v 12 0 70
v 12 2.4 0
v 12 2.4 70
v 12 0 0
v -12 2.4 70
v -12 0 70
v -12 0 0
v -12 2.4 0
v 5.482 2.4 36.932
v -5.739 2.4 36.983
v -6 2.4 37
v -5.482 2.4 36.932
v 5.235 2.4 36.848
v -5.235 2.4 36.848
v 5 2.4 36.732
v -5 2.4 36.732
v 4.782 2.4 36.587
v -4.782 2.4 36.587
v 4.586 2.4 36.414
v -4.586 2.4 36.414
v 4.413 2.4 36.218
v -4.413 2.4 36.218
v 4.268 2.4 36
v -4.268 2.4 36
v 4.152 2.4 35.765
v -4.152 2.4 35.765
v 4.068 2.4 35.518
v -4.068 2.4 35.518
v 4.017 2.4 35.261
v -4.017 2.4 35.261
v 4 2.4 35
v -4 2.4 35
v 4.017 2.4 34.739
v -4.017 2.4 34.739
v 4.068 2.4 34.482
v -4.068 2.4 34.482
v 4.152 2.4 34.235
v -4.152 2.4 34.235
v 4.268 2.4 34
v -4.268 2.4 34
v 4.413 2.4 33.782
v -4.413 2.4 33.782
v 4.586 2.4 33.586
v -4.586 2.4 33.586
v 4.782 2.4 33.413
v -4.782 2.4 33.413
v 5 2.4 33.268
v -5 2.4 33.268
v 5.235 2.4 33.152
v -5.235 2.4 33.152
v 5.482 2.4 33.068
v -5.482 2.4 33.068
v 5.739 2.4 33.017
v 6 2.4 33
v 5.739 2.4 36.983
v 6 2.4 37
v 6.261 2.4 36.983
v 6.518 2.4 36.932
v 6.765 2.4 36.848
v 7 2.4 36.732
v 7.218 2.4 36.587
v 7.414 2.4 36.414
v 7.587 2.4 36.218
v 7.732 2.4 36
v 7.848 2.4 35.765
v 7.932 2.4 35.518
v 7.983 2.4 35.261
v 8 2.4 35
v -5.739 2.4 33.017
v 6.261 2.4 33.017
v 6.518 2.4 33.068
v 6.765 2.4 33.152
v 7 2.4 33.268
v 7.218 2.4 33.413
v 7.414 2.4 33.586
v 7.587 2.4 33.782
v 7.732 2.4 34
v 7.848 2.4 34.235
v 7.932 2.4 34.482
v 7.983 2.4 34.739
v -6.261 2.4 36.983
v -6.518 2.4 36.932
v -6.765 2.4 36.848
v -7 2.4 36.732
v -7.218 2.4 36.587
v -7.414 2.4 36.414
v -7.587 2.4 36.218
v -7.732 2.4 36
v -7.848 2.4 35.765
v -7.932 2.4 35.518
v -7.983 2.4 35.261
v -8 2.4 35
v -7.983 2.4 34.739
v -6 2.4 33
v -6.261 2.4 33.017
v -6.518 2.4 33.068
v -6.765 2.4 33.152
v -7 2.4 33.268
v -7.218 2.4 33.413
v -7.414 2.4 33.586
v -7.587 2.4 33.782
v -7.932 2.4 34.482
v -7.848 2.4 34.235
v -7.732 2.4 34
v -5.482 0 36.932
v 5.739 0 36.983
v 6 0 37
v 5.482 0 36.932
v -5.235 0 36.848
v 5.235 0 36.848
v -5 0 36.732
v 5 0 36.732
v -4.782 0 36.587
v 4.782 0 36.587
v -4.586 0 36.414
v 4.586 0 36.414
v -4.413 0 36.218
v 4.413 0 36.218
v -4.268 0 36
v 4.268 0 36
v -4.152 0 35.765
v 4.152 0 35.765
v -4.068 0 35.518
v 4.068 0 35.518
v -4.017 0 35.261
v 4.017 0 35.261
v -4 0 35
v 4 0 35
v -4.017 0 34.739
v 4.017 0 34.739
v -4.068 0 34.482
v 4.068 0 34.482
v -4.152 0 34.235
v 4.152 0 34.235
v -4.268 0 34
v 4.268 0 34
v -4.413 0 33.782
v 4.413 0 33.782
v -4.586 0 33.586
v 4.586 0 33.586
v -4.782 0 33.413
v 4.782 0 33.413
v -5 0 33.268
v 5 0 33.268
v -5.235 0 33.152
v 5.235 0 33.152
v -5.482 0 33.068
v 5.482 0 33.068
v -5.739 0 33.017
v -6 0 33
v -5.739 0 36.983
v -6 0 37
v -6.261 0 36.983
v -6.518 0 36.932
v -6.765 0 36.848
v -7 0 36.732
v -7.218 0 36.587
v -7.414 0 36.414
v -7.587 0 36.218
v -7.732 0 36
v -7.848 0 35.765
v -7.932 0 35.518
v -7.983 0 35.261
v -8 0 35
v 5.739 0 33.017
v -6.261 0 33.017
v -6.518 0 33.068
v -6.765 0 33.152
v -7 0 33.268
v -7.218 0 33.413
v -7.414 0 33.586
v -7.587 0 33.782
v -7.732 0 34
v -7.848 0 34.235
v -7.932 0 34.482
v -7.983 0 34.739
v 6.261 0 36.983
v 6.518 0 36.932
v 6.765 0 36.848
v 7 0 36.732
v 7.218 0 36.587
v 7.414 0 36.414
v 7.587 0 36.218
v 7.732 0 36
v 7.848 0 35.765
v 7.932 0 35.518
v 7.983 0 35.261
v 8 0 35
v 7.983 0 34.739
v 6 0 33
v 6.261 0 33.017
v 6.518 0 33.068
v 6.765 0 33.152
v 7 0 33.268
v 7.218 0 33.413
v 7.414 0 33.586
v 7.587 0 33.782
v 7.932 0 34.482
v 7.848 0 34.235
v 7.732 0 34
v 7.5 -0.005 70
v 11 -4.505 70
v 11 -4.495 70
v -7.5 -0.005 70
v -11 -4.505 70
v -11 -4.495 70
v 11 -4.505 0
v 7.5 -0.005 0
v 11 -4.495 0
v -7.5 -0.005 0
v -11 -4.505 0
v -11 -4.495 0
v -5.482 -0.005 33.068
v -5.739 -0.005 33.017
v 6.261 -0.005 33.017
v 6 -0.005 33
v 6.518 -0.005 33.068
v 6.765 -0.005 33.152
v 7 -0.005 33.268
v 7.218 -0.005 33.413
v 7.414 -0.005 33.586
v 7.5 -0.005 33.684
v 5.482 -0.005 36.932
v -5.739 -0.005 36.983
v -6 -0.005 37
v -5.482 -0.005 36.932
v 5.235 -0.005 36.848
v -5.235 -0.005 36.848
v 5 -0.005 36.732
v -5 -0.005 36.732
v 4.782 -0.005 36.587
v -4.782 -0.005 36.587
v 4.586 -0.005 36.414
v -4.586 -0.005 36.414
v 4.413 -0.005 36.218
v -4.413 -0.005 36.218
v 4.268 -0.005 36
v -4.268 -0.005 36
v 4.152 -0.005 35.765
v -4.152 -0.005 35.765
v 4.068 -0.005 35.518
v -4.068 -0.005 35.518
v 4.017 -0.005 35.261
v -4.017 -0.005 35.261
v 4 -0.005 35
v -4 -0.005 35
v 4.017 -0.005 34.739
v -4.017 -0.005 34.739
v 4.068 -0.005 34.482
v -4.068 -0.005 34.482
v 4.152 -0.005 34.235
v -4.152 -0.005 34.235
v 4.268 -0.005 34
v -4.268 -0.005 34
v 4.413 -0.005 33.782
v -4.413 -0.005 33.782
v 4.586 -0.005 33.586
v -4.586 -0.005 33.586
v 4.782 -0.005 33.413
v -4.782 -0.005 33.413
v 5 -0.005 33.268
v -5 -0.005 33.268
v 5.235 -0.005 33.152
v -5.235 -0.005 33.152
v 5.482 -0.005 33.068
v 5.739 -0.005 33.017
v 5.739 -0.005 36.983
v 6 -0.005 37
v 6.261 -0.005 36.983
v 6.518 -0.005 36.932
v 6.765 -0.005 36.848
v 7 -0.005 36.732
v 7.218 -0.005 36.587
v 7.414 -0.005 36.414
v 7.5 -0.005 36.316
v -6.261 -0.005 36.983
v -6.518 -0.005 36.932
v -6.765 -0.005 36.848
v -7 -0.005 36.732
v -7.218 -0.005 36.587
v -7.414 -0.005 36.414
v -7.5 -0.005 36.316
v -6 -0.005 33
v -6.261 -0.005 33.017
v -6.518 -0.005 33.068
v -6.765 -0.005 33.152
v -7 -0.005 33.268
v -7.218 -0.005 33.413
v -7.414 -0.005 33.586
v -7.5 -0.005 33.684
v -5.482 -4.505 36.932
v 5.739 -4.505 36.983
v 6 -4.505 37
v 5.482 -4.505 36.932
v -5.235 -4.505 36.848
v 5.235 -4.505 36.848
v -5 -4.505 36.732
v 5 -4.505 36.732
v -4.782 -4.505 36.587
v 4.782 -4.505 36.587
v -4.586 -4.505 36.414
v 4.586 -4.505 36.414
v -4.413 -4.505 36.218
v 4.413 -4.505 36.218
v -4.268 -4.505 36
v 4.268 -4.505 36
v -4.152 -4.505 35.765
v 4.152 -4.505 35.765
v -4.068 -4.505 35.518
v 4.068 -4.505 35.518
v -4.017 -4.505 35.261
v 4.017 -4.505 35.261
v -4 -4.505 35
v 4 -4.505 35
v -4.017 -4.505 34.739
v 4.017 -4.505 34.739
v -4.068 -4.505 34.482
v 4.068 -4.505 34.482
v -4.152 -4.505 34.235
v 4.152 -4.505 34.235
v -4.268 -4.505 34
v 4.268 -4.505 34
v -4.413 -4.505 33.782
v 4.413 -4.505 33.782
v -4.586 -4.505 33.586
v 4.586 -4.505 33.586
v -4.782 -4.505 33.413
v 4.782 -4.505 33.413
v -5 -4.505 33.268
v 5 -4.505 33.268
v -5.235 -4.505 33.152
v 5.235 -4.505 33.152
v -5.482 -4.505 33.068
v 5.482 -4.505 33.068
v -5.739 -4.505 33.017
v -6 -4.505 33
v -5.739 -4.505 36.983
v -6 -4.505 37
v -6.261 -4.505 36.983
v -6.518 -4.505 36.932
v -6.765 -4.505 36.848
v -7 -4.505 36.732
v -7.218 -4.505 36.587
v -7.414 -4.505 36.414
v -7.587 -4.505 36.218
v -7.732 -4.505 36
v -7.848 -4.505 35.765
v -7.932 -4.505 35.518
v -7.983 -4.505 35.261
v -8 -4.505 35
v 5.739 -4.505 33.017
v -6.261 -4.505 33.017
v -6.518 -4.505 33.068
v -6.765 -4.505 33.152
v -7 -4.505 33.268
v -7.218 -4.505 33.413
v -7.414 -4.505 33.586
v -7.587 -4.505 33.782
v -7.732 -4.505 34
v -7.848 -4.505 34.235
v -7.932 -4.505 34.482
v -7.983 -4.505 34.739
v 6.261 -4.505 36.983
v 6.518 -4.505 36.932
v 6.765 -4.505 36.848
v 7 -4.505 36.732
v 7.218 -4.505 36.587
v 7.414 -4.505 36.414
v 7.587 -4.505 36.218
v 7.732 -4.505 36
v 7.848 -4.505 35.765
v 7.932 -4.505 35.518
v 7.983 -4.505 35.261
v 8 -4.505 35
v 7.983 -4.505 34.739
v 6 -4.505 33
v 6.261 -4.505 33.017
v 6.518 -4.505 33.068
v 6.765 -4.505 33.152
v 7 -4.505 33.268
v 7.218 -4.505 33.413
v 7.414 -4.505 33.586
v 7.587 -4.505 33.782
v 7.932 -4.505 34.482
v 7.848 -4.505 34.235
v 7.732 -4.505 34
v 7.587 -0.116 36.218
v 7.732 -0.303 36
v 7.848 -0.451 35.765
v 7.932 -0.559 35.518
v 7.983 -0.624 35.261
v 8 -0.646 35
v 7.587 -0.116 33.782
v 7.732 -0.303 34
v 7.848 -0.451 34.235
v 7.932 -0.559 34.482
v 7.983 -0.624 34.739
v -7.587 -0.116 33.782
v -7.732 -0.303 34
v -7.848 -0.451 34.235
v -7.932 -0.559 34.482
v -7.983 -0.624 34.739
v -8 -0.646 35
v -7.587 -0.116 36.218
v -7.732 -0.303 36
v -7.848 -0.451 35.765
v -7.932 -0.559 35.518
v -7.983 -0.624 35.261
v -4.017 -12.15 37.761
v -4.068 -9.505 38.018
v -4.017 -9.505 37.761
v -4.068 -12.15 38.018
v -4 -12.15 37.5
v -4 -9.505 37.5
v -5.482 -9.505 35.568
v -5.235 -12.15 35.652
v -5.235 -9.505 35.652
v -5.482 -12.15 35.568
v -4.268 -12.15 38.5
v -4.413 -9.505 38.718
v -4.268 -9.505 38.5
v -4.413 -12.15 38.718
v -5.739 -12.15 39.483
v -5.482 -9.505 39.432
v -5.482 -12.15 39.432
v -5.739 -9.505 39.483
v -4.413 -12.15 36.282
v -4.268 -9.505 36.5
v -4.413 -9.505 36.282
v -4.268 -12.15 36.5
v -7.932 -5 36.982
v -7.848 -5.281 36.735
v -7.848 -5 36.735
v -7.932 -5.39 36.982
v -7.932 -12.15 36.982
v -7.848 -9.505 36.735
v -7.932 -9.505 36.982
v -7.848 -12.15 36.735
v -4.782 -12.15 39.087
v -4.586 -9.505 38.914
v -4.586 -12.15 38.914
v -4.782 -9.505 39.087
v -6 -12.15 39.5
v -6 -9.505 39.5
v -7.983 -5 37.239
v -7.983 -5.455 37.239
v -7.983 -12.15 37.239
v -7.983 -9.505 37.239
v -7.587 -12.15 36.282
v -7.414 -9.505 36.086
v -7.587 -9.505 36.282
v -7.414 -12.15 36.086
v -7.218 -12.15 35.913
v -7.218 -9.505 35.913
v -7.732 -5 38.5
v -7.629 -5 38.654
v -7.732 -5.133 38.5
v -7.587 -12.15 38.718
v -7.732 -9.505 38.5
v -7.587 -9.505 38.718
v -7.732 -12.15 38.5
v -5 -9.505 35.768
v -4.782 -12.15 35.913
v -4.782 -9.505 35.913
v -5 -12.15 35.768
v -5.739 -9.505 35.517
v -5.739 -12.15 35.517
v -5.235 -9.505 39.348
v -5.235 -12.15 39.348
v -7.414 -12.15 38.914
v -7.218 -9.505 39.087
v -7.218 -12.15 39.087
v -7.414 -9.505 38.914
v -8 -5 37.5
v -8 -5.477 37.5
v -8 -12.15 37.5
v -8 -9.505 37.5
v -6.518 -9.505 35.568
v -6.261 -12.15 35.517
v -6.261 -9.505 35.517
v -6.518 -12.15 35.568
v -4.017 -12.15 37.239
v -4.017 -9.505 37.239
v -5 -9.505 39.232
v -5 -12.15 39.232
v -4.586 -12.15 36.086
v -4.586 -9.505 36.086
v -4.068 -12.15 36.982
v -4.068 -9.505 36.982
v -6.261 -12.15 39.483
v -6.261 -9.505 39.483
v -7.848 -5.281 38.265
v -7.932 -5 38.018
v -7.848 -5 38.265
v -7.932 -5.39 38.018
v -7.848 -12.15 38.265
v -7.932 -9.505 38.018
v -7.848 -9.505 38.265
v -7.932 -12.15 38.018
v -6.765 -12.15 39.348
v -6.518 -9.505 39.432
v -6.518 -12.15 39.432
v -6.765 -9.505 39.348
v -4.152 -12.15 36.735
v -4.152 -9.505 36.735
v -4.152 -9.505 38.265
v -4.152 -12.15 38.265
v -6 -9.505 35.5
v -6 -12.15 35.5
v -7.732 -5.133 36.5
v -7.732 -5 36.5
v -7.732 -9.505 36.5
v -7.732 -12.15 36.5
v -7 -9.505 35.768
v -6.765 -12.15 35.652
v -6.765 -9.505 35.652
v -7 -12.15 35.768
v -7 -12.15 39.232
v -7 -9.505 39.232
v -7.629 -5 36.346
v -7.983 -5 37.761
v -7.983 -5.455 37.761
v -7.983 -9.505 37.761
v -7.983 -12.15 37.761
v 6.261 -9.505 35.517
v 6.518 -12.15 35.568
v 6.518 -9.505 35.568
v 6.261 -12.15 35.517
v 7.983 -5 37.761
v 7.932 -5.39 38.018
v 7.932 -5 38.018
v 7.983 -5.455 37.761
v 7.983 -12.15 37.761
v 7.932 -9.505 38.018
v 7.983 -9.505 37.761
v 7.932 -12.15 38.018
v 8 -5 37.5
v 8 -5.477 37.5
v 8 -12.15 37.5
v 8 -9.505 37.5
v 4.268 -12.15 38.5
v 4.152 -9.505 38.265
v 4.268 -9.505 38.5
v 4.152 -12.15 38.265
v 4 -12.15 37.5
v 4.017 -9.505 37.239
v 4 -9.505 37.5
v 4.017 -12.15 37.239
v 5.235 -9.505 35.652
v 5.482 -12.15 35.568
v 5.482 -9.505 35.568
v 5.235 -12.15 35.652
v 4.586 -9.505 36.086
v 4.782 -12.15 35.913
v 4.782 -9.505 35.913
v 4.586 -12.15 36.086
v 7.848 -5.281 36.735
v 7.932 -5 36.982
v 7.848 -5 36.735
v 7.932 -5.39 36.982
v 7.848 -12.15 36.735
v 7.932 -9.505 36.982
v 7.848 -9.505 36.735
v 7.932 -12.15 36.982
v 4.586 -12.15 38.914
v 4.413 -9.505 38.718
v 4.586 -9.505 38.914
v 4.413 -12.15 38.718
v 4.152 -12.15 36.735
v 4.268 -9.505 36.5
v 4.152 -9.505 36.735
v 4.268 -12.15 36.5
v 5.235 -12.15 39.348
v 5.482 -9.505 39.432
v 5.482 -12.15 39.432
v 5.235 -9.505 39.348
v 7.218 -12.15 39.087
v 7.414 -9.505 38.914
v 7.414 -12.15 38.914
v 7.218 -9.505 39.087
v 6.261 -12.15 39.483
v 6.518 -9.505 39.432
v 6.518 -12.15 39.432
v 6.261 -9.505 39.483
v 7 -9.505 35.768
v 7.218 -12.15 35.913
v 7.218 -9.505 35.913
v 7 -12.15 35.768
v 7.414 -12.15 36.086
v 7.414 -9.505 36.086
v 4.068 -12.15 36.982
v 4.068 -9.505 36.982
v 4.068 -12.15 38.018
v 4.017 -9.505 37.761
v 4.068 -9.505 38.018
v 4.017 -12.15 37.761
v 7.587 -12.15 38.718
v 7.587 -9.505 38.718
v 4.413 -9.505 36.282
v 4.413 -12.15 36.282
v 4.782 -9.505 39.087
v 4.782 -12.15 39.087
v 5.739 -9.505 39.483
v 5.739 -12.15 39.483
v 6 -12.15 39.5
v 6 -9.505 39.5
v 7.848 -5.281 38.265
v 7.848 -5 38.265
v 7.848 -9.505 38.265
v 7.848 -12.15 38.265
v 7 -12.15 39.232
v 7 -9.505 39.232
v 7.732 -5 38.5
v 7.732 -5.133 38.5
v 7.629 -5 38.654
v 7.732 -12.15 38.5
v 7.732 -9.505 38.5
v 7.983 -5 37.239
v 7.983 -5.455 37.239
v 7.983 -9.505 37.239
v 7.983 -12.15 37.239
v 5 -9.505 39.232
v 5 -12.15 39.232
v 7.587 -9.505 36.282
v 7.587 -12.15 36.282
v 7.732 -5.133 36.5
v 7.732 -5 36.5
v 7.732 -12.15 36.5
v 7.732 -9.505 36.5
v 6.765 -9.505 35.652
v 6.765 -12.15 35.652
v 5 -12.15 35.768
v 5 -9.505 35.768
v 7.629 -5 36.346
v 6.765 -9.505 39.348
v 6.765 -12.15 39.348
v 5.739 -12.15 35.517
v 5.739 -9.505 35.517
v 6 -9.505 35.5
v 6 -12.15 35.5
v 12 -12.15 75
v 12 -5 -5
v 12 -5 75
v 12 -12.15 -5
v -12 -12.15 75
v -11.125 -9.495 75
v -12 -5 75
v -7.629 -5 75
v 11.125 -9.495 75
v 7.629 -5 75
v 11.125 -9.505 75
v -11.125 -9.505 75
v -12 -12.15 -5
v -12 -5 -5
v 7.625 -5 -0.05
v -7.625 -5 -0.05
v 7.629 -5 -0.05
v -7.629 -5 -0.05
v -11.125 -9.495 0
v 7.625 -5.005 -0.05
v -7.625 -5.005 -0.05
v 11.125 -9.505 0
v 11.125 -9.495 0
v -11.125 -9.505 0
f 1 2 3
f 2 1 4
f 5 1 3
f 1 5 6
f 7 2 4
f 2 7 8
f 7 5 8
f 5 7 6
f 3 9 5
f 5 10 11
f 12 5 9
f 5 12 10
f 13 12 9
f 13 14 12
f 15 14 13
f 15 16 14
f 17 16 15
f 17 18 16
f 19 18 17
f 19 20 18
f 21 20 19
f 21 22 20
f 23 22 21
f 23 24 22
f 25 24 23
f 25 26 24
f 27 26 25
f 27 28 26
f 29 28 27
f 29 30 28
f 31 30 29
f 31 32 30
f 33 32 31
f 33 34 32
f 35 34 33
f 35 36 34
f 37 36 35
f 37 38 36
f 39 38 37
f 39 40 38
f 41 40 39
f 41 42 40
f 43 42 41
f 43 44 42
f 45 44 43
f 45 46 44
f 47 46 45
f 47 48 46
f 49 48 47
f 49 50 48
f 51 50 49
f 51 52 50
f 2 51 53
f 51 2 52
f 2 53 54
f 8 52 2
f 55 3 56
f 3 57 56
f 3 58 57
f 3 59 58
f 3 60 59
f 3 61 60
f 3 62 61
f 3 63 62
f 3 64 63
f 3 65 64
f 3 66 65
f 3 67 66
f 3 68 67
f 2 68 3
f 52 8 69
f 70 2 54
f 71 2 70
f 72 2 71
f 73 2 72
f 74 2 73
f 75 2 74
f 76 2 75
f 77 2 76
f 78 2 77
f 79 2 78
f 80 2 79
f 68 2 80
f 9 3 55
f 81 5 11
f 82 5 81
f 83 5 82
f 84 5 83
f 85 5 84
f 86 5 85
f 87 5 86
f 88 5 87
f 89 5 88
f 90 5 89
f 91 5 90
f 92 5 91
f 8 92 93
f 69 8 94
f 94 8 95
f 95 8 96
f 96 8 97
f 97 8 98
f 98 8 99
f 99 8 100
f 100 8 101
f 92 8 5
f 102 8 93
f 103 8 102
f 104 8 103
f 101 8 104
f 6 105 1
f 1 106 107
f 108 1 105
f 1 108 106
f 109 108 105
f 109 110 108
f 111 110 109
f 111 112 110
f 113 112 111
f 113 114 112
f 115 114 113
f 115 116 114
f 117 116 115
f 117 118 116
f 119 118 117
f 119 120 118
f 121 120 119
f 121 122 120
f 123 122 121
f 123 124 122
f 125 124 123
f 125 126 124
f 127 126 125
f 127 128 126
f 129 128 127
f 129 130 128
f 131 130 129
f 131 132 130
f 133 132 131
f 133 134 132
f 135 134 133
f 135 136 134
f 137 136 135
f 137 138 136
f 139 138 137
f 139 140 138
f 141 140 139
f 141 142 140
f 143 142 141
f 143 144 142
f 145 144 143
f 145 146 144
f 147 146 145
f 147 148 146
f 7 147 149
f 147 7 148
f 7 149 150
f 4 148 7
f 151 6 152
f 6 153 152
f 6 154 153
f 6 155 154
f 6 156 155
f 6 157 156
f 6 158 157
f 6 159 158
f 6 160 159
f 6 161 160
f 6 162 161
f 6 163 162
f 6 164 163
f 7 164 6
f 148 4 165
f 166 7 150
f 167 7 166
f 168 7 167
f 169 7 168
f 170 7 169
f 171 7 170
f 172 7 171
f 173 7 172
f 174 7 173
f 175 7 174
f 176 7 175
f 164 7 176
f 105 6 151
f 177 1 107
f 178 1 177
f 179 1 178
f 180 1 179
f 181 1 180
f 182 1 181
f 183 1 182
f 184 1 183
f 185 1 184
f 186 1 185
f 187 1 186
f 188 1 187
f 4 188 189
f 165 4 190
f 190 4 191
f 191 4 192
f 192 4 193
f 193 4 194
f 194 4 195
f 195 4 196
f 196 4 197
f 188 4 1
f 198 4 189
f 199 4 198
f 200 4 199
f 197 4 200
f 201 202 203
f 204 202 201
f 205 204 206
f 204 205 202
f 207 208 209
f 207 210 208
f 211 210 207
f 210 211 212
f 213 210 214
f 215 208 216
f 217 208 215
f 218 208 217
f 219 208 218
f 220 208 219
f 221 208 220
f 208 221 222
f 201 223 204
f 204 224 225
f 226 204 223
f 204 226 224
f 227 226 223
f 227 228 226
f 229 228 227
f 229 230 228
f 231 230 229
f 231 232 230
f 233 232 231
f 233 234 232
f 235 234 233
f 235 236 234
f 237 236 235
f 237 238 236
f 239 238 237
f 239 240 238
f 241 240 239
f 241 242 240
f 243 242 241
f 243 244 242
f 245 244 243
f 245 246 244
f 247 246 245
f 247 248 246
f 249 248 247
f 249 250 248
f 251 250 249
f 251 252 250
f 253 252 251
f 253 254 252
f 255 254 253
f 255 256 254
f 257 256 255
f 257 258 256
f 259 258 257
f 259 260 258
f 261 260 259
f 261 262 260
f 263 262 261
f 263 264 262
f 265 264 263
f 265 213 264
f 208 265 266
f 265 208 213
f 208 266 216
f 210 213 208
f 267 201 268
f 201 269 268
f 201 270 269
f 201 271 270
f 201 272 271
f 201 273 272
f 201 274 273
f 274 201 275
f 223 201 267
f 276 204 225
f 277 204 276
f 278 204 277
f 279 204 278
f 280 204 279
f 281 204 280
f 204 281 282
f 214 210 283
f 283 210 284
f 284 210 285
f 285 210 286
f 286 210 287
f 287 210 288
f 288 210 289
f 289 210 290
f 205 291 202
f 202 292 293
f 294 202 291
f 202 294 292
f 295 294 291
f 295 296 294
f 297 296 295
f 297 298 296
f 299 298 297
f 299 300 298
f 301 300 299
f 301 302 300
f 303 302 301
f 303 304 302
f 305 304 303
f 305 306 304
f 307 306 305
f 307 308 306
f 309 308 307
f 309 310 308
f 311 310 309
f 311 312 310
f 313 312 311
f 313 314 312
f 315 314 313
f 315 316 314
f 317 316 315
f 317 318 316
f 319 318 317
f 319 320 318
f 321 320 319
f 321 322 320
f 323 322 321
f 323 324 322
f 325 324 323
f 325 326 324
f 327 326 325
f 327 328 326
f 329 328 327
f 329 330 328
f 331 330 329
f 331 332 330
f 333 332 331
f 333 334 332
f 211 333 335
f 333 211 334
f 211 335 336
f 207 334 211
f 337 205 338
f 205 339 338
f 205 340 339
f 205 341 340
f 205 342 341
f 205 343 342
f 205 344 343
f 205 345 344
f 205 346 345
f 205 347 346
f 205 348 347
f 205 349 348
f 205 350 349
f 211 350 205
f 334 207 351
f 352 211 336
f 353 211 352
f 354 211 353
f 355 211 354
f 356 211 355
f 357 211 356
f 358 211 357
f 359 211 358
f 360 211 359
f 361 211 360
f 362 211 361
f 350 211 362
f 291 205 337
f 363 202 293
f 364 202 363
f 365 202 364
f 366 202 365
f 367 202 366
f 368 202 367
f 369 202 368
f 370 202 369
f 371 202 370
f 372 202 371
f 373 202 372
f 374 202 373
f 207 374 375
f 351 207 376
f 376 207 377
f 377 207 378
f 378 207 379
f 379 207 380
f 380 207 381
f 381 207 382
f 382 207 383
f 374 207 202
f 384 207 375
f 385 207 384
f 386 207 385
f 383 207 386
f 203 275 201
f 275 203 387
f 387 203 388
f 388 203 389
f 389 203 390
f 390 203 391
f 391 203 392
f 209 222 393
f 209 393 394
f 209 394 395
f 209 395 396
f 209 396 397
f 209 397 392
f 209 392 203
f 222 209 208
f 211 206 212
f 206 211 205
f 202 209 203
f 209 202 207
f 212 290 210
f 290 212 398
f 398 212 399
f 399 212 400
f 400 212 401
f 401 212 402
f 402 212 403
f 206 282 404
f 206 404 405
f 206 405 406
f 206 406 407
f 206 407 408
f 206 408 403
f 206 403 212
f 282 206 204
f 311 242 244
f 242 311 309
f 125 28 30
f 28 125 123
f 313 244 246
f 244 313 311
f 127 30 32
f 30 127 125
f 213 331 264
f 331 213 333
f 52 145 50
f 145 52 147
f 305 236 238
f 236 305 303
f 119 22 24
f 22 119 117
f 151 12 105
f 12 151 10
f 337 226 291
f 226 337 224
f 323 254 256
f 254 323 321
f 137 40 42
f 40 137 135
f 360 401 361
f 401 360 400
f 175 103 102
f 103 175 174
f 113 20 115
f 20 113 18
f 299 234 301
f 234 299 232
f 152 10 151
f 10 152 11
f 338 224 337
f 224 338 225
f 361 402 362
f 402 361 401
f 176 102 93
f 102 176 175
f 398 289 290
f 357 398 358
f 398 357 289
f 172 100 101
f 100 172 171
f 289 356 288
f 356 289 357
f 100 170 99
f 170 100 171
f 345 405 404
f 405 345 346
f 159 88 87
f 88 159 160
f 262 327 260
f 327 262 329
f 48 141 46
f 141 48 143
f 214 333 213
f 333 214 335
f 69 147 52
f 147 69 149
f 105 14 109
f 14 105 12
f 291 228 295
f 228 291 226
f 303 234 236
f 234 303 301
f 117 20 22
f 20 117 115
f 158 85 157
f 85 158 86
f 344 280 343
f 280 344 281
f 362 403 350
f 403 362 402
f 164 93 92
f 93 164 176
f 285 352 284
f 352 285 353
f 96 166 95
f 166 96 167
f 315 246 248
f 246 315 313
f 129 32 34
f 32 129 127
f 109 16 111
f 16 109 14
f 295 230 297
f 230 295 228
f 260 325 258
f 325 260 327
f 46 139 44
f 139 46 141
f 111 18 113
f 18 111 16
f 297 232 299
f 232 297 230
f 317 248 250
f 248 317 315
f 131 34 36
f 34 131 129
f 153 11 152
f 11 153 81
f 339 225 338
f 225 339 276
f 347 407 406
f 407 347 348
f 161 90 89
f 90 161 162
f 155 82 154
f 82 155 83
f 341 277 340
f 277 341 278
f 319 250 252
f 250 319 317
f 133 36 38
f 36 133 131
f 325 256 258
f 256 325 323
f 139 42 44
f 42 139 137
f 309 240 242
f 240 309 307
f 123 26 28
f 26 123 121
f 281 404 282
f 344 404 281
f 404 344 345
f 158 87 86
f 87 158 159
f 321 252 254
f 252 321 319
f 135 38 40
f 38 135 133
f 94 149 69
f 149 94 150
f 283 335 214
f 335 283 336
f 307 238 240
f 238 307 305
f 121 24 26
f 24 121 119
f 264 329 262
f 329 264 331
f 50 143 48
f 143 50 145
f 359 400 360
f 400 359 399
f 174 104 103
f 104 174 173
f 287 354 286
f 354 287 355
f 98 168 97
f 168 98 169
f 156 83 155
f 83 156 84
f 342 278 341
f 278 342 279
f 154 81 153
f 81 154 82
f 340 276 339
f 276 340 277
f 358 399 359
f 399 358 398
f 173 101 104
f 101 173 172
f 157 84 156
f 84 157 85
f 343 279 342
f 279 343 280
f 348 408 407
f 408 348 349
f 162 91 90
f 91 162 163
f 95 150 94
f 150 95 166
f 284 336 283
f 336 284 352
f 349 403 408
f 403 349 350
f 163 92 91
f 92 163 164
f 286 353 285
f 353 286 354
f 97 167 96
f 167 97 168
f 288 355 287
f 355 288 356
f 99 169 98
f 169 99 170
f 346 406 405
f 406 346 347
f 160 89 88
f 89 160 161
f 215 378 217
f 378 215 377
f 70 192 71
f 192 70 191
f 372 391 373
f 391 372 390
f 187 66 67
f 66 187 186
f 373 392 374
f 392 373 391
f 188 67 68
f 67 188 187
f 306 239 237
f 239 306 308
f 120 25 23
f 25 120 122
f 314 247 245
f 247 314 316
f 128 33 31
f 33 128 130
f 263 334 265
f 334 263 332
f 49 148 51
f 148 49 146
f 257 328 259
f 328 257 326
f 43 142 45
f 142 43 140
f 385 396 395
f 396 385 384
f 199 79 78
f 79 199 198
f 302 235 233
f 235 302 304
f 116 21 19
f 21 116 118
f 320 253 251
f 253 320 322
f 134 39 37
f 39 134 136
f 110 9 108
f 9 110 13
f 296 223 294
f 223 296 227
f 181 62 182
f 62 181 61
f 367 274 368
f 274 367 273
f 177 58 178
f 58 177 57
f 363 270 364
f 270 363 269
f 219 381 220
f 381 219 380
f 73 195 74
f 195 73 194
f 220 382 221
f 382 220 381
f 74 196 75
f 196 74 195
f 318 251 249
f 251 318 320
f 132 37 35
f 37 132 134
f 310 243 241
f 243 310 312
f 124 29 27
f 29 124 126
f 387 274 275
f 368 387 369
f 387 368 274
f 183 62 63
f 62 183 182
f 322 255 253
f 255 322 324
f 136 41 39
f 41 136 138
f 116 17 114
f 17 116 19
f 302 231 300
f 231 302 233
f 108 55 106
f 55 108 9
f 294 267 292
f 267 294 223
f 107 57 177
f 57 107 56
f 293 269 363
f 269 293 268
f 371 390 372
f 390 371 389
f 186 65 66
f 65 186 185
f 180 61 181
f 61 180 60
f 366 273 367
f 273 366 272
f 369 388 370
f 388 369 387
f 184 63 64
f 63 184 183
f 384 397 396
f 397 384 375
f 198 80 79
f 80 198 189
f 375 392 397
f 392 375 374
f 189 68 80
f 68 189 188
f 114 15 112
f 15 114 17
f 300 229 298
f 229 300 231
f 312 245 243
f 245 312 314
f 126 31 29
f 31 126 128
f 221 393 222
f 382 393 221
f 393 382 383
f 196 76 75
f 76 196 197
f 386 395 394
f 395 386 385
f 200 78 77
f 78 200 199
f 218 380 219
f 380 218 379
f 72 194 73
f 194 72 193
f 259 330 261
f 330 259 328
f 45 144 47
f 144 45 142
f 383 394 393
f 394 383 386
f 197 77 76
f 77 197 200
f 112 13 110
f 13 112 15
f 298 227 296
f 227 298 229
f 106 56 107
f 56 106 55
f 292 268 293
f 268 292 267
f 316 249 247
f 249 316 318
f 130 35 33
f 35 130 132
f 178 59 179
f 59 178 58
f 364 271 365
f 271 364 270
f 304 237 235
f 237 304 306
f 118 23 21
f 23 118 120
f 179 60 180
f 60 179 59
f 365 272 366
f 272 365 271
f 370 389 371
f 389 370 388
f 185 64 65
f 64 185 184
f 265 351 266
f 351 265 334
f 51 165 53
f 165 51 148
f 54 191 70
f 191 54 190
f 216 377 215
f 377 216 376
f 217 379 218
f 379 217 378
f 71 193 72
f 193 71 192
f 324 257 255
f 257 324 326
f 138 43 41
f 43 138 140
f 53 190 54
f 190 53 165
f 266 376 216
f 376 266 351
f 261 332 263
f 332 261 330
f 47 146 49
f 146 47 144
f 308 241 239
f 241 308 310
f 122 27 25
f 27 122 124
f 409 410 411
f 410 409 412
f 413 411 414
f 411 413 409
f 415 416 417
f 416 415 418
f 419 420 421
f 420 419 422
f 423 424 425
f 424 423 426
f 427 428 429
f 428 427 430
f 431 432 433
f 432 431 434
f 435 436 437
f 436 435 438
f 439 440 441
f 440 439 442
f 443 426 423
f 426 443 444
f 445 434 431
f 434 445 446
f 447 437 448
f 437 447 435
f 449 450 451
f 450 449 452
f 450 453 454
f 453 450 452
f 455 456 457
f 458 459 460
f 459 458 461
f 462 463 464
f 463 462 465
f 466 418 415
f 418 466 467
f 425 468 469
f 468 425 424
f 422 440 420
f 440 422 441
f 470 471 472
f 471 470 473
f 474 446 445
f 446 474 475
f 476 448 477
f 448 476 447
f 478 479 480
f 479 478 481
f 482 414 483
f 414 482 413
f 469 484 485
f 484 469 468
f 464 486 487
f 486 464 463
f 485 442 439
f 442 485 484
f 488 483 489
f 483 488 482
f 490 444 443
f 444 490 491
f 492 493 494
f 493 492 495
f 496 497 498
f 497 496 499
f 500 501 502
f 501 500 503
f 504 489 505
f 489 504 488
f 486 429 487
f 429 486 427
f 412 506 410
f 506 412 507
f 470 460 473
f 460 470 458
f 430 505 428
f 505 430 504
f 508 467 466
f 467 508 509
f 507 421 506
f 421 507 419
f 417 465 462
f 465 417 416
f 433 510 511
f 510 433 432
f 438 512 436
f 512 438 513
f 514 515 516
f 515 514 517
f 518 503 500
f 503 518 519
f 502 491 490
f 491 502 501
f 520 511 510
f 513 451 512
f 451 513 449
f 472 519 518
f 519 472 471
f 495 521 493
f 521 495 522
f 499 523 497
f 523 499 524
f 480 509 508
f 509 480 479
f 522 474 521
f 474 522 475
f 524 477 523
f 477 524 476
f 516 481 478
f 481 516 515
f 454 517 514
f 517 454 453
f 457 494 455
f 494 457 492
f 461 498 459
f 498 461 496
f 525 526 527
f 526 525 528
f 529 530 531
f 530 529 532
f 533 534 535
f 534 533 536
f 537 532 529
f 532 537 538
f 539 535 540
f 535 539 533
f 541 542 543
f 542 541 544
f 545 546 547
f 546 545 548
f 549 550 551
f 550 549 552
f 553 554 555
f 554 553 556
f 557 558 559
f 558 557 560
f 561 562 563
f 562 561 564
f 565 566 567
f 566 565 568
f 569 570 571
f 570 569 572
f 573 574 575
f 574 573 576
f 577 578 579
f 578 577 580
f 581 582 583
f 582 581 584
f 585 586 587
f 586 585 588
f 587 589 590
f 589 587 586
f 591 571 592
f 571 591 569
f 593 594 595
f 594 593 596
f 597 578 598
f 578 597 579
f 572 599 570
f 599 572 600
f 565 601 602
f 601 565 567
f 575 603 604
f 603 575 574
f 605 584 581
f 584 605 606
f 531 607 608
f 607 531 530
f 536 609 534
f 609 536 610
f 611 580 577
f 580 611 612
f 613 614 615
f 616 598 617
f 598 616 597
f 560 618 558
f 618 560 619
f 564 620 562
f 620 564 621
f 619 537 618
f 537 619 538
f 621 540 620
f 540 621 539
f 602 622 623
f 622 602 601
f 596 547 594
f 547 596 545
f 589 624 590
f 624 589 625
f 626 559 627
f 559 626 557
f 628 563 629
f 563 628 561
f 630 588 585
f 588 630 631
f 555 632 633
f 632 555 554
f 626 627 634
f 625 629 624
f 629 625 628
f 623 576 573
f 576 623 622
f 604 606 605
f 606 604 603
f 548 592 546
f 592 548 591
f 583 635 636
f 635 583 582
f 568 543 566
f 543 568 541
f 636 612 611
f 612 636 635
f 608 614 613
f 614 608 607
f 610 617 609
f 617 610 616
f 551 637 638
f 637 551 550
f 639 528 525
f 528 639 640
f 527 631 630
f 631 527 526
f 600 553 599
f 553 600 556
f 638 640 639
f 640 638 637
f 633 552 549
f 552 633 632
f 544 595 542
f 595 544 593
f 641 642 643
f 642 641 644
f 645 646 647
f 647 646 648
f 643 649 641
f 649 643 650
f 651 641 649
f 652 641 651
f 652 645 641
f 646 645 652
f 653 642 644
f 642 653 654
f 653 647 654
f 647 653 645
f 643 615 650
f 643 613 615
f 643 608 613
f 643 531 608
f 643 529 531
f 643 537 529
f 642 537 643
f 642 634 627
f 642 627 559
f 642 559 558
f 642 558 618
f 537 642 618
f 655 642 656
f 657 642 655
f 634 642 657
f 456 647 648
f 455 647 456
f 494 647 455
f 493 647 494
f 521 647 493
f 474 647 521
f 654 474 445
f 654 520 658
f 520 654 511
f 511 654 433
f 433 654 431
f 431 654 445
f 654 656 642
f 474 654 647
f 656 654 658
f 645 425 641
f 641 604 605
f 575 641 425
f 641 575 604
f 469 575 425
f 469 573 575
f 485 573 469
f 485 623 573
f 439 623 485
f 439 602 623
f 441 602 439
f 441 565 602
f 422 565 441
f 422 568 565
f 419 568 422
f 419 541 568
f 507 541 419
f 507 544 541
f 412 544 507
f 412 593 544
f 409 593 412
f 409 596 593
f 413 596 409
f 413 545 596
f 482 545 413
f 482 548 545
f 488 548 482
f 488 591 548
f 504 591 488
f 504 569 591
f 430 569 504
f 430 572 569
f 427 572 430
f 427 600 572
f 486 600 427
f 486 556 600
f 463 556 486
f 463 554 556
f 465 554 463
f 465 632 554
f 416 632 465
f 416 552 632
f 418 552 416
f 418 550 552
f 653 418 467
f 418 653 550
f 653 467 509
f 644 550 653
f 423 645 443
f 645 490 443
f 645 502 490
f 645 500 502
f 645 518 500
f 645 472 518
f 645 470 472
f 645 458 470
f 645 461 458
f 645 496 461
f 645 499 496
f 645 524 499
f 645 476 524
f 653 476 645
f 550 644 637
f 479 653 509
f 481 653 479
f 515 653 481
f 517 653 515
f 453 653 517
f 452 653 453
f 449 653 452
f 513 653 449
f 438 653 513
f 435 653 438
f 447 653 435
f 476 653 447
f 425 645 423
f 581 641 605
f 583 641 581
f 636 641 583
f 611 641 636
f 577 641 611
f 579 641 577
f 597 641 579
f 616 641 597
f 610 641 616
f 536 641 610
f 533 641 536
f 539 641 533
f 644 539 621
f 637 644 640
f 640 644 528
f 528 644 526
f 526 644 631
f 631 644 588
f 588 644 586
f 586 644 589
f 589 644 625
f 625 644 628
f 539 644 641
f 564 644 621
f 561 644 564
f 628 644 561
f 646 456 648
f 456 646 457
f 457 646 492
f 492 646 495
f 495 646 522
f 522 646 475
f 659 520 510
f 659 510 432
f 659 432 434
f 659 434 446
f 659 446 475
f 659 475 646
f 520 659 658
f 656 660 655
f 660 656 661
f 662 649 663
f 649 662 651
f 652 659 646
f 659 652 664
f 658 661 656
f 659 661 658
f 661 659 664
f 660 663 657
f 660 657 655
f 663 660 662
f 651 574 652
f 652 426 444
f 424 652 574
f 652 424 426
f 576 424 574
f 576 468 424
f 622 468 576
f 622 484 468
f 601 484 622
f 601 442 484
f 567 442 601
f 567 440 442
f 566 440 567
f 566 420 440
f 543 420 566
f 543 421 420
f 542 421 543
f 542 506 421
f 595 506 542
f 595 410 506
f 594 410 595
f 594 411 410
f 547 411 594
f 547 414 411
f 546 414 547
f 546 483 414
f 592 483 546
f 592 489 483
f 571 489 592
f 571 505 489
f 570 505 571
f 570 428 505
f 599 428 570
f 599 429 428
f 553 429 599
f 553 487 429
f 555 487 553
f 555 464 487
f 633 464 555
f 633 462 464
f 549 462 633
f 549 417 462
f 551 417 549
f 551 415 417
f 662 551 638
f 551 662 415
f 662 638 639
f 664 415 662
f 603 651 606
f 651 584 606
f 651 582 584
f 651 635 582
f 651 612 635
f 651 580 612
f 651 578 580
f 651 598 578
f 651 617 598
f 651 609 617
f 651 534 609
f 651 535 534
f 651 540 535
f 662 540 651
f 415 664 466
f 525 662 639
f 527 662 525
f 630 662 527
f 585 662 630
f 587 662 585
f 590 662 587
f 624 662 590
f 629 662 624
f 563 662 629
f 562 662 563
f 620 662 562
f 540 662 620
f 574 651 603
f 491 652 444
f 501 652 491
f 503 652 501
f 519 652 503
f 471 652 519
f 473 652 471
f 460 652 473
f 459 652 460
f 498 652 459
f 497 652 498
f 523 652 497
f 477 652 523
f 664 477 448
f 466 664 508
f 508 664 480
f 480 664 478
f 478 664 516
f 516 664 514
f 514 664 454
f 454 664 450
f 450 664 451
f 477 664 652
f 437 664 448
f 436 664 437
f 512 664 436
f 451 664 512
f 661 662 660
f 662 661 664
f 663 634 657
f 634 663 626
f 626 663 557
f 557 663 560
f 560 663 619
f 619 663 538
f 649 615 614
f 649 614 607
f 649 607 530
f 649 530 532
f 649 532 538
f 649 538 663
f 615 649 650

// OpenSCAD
/* ==========================================================================
    Dovetail from the box/ bin model, extracted and parameterized for stand-alone use.
    The dovetail can be screwed or glued to the back of what needs to be mounted.
    
    Designed by Notydesign
/* ==========================================================================

/* [Display options] */
show_dovetail = true;         // Render the mating male dovetail.
show_bracket = true;          // Render the mating female bracket.

//Female backstop bottom/top
mirror_backstop = false;          // Mirror the view by rotating 180° around Y axis
color = "#4682B4";

/* [Dovetail male parameters] */
dovetail_width_wide = 22;
dovetail_width_narrow = 15;
dovetail_depth = 4.5;
dovetail_tolerance = 0.25;
dovetail_plate_width = 24;
dovetail_plate_thickness = 2.4;
dovetail_plate_height = 70;


/* [Dovetail male screw hole parameters] */
show_dovetail_screw_holes = true;
dovetail_screw_count = 2;
dovetail_screw_row_count = 1;
dovetail_screw_row_spacing = 20;
dovetail_screw_edge_margin = 6;
mount_screw_hole_diameter = 4;

/* [Dovetail female parameters] */
// Adds extra height to the female. 0 = same height as male
dovetail_female_extra_height = 5;
female_backstop = 5.0; // stopping for the dovetail

/* [Dovetail female screw hole parameters] */
// Female screw hole parameters (independent from male)
show_female_screw_holes = true;
dovetail_female_screw_count = 2;
dovetail_female_screw_row_count = 1;
dovetail_female_screw_row_spacing = 20;
dovetail_female_screw_edge_margin = 6;
dovetail_female_mount_screw_hole_diameter = 4;

/* [Helper variables] */
distance_between_brackets = -5.0;


/* Main preview */
if (mirror_backstop) {
    translate([0, 0, dovetail_plate_height])
    rotate([0, 180, 0]) {
        if (show_dovetail) {
            dovetail_male();
        }
        if (show_bracket) {
            dovetail_female();
        }
    }
} else {
    if (show_dovetail) {
        dovetail_male();
    }
    if (show_bracket) {
        dovetail_female();
    }
}

module dovetail_male() {
    color(color)
    difference() {
        union() {
            // Solid dovetail plate base with a stop in the Y direction to prevent over-insertion
            translate([-dovetail_plate_width/2, 0, 0])
            cube([dovetail_plate_width, dovetail_plate_thickness, dovetail_plate_height]);

            // Create the dovetail profile using hull to ensure clean geometry without coplanar faces
            translate([0, 0, dovetail_plate_height/2])
            hull() {
                translate([0, -0.01, 0])
                cube([dovetail_width_narrow, 0.01, dovetail_plate_height], center=true);

                translate([0, -dovetail_depth, 0])
                cube([dovetail_width_wide, 0.01, dovetail_plate_height], center=true);
            }
        }

        if (show_dovetail_screw_holes) {
            // Calculate hole positions based on the number of screws and edge margins
            hole_positions = (dovetail_screw_count == 1) ? [0]
                : [for (i = [0 : dovetail_screw_count - 1])
                    -dovetail_plate_width/2 + dovetail_screw_edge_margin + i * (dovetail_plate_width - 2 * dovetail_screw_edge_margin) / max(1, dovetail_screw_count - 1)];
            // Calculate row positions based on the number of rows and spacing
            row_count = max(1, dovetail_screw_row_count);
            row_positions = (row_count == 1) ? [dovetail_plate_height/2]
                : [for (r = [0 : row_count - 1])
                    dovetail_plate_height/2 - ((row_count - 1) * dovetail_screw_row_spacing) / 2 + r * dovetail_screw_row_spacing];
            // Create holes at the calculated positions, adding extra length to ensure they go through the entire piece
            for (x_pos = hole_positions) {
                for (z_pos = row_positions) {
                    translate([x_pos, dovetail_plate_thickness/2, z_pos])
                    rotate([90, 0, 0])
                    // Added 5 extra length to ensure the hole goes through the entire piece, even with slight misalignments
                    cylinder(h = dovetail_depth + dovetail_plate_thickness + 5, d = mount_screw_hole_diameter, center = true, $fn = 48);
                }
            }
        }
    }
}

module dovetail_female() {
    color(color)
    translate([0, distance_between_brackets, 0])
    difference() {
        // Solid receiving block with a stop in the Z direction
        translate([-dovetail_plate_width/2, -dovetail_depth - dovetail_plate_thickness - dovetail_tolerance, -female_backstop])
        cube([dovetail_plate_width, dovetail_depth + dovetail_plate_thickness + dovetail_tolerance, dovetail_plate_height + dovetail_female_extra_height + female_backstop]);

        // Carve the matching dovetail cavity, expanded upward with extra height
        translate([0, 0, dovetail_plate_height/2 + dovetail_female_extra_height/2])
        hull() {
            translate([0, 0, 0])
            // added 0.1 to avoid coplanar faces which can cause rendering issues in some viewers
            cube([dovetail_width_narrow + dovetail_tolerance, 0.01, dovetail_plate_height + dovetail_female_extra_height + 0.1], center=true);

            translate([0, -dovetail_depth, 0])
            cube([dovetail_width_wide + dovetail_tolerance, 0.01, dovetail_plate_height + dovetail_female_extra_height], center=true);
        }

        if (show_female_screw_holes) {
            hole_positions = (dovetail_female_screw_count == 1) ? [0]
                : [for (i = [0 : dovetail_female_screw_count - 1])
                    -dovetail_plate_width/2 + dovetail_female_screw_edge_margin + i * (dovetail_plate_width - 2 * dovetail_female_screw_edge_margin) / max(1, dovetail_female_screw_count - 1)];

            row_count = max(1, dovetail_female_screw_row_count);
            row_positions = (row_count == 1) ? [dovetail_plate_height/2 + dovetail_female_extra_height/2]
                : [for (r = [0 : row_count - 1])
                    dovetail_plate_height/2 + dovetail_female_extra_height/2 - ((row_count - 1) * dovetail_female_screw_row_spacing) / 2 + r * dovetail_female_screw_row_spacing];
            
            for (x_pos = hole_positions) {
                for (z_pos = row_positions) {
                    translate([x_pos, -dovetail_plate_thickness/2, z_pos])
                    rotate([90, 0, 0])
                    // Added 5 extra length to ensure the hole goes through the entire piece, even with slight misalignments
                    cylinder(h = dovetail_depth + dovetail_plate_thickness + 6, d = dovetail_female_mount_screw_hole_diameter, center = true, $fn = 48);
                }
            }
        }
    }
}
